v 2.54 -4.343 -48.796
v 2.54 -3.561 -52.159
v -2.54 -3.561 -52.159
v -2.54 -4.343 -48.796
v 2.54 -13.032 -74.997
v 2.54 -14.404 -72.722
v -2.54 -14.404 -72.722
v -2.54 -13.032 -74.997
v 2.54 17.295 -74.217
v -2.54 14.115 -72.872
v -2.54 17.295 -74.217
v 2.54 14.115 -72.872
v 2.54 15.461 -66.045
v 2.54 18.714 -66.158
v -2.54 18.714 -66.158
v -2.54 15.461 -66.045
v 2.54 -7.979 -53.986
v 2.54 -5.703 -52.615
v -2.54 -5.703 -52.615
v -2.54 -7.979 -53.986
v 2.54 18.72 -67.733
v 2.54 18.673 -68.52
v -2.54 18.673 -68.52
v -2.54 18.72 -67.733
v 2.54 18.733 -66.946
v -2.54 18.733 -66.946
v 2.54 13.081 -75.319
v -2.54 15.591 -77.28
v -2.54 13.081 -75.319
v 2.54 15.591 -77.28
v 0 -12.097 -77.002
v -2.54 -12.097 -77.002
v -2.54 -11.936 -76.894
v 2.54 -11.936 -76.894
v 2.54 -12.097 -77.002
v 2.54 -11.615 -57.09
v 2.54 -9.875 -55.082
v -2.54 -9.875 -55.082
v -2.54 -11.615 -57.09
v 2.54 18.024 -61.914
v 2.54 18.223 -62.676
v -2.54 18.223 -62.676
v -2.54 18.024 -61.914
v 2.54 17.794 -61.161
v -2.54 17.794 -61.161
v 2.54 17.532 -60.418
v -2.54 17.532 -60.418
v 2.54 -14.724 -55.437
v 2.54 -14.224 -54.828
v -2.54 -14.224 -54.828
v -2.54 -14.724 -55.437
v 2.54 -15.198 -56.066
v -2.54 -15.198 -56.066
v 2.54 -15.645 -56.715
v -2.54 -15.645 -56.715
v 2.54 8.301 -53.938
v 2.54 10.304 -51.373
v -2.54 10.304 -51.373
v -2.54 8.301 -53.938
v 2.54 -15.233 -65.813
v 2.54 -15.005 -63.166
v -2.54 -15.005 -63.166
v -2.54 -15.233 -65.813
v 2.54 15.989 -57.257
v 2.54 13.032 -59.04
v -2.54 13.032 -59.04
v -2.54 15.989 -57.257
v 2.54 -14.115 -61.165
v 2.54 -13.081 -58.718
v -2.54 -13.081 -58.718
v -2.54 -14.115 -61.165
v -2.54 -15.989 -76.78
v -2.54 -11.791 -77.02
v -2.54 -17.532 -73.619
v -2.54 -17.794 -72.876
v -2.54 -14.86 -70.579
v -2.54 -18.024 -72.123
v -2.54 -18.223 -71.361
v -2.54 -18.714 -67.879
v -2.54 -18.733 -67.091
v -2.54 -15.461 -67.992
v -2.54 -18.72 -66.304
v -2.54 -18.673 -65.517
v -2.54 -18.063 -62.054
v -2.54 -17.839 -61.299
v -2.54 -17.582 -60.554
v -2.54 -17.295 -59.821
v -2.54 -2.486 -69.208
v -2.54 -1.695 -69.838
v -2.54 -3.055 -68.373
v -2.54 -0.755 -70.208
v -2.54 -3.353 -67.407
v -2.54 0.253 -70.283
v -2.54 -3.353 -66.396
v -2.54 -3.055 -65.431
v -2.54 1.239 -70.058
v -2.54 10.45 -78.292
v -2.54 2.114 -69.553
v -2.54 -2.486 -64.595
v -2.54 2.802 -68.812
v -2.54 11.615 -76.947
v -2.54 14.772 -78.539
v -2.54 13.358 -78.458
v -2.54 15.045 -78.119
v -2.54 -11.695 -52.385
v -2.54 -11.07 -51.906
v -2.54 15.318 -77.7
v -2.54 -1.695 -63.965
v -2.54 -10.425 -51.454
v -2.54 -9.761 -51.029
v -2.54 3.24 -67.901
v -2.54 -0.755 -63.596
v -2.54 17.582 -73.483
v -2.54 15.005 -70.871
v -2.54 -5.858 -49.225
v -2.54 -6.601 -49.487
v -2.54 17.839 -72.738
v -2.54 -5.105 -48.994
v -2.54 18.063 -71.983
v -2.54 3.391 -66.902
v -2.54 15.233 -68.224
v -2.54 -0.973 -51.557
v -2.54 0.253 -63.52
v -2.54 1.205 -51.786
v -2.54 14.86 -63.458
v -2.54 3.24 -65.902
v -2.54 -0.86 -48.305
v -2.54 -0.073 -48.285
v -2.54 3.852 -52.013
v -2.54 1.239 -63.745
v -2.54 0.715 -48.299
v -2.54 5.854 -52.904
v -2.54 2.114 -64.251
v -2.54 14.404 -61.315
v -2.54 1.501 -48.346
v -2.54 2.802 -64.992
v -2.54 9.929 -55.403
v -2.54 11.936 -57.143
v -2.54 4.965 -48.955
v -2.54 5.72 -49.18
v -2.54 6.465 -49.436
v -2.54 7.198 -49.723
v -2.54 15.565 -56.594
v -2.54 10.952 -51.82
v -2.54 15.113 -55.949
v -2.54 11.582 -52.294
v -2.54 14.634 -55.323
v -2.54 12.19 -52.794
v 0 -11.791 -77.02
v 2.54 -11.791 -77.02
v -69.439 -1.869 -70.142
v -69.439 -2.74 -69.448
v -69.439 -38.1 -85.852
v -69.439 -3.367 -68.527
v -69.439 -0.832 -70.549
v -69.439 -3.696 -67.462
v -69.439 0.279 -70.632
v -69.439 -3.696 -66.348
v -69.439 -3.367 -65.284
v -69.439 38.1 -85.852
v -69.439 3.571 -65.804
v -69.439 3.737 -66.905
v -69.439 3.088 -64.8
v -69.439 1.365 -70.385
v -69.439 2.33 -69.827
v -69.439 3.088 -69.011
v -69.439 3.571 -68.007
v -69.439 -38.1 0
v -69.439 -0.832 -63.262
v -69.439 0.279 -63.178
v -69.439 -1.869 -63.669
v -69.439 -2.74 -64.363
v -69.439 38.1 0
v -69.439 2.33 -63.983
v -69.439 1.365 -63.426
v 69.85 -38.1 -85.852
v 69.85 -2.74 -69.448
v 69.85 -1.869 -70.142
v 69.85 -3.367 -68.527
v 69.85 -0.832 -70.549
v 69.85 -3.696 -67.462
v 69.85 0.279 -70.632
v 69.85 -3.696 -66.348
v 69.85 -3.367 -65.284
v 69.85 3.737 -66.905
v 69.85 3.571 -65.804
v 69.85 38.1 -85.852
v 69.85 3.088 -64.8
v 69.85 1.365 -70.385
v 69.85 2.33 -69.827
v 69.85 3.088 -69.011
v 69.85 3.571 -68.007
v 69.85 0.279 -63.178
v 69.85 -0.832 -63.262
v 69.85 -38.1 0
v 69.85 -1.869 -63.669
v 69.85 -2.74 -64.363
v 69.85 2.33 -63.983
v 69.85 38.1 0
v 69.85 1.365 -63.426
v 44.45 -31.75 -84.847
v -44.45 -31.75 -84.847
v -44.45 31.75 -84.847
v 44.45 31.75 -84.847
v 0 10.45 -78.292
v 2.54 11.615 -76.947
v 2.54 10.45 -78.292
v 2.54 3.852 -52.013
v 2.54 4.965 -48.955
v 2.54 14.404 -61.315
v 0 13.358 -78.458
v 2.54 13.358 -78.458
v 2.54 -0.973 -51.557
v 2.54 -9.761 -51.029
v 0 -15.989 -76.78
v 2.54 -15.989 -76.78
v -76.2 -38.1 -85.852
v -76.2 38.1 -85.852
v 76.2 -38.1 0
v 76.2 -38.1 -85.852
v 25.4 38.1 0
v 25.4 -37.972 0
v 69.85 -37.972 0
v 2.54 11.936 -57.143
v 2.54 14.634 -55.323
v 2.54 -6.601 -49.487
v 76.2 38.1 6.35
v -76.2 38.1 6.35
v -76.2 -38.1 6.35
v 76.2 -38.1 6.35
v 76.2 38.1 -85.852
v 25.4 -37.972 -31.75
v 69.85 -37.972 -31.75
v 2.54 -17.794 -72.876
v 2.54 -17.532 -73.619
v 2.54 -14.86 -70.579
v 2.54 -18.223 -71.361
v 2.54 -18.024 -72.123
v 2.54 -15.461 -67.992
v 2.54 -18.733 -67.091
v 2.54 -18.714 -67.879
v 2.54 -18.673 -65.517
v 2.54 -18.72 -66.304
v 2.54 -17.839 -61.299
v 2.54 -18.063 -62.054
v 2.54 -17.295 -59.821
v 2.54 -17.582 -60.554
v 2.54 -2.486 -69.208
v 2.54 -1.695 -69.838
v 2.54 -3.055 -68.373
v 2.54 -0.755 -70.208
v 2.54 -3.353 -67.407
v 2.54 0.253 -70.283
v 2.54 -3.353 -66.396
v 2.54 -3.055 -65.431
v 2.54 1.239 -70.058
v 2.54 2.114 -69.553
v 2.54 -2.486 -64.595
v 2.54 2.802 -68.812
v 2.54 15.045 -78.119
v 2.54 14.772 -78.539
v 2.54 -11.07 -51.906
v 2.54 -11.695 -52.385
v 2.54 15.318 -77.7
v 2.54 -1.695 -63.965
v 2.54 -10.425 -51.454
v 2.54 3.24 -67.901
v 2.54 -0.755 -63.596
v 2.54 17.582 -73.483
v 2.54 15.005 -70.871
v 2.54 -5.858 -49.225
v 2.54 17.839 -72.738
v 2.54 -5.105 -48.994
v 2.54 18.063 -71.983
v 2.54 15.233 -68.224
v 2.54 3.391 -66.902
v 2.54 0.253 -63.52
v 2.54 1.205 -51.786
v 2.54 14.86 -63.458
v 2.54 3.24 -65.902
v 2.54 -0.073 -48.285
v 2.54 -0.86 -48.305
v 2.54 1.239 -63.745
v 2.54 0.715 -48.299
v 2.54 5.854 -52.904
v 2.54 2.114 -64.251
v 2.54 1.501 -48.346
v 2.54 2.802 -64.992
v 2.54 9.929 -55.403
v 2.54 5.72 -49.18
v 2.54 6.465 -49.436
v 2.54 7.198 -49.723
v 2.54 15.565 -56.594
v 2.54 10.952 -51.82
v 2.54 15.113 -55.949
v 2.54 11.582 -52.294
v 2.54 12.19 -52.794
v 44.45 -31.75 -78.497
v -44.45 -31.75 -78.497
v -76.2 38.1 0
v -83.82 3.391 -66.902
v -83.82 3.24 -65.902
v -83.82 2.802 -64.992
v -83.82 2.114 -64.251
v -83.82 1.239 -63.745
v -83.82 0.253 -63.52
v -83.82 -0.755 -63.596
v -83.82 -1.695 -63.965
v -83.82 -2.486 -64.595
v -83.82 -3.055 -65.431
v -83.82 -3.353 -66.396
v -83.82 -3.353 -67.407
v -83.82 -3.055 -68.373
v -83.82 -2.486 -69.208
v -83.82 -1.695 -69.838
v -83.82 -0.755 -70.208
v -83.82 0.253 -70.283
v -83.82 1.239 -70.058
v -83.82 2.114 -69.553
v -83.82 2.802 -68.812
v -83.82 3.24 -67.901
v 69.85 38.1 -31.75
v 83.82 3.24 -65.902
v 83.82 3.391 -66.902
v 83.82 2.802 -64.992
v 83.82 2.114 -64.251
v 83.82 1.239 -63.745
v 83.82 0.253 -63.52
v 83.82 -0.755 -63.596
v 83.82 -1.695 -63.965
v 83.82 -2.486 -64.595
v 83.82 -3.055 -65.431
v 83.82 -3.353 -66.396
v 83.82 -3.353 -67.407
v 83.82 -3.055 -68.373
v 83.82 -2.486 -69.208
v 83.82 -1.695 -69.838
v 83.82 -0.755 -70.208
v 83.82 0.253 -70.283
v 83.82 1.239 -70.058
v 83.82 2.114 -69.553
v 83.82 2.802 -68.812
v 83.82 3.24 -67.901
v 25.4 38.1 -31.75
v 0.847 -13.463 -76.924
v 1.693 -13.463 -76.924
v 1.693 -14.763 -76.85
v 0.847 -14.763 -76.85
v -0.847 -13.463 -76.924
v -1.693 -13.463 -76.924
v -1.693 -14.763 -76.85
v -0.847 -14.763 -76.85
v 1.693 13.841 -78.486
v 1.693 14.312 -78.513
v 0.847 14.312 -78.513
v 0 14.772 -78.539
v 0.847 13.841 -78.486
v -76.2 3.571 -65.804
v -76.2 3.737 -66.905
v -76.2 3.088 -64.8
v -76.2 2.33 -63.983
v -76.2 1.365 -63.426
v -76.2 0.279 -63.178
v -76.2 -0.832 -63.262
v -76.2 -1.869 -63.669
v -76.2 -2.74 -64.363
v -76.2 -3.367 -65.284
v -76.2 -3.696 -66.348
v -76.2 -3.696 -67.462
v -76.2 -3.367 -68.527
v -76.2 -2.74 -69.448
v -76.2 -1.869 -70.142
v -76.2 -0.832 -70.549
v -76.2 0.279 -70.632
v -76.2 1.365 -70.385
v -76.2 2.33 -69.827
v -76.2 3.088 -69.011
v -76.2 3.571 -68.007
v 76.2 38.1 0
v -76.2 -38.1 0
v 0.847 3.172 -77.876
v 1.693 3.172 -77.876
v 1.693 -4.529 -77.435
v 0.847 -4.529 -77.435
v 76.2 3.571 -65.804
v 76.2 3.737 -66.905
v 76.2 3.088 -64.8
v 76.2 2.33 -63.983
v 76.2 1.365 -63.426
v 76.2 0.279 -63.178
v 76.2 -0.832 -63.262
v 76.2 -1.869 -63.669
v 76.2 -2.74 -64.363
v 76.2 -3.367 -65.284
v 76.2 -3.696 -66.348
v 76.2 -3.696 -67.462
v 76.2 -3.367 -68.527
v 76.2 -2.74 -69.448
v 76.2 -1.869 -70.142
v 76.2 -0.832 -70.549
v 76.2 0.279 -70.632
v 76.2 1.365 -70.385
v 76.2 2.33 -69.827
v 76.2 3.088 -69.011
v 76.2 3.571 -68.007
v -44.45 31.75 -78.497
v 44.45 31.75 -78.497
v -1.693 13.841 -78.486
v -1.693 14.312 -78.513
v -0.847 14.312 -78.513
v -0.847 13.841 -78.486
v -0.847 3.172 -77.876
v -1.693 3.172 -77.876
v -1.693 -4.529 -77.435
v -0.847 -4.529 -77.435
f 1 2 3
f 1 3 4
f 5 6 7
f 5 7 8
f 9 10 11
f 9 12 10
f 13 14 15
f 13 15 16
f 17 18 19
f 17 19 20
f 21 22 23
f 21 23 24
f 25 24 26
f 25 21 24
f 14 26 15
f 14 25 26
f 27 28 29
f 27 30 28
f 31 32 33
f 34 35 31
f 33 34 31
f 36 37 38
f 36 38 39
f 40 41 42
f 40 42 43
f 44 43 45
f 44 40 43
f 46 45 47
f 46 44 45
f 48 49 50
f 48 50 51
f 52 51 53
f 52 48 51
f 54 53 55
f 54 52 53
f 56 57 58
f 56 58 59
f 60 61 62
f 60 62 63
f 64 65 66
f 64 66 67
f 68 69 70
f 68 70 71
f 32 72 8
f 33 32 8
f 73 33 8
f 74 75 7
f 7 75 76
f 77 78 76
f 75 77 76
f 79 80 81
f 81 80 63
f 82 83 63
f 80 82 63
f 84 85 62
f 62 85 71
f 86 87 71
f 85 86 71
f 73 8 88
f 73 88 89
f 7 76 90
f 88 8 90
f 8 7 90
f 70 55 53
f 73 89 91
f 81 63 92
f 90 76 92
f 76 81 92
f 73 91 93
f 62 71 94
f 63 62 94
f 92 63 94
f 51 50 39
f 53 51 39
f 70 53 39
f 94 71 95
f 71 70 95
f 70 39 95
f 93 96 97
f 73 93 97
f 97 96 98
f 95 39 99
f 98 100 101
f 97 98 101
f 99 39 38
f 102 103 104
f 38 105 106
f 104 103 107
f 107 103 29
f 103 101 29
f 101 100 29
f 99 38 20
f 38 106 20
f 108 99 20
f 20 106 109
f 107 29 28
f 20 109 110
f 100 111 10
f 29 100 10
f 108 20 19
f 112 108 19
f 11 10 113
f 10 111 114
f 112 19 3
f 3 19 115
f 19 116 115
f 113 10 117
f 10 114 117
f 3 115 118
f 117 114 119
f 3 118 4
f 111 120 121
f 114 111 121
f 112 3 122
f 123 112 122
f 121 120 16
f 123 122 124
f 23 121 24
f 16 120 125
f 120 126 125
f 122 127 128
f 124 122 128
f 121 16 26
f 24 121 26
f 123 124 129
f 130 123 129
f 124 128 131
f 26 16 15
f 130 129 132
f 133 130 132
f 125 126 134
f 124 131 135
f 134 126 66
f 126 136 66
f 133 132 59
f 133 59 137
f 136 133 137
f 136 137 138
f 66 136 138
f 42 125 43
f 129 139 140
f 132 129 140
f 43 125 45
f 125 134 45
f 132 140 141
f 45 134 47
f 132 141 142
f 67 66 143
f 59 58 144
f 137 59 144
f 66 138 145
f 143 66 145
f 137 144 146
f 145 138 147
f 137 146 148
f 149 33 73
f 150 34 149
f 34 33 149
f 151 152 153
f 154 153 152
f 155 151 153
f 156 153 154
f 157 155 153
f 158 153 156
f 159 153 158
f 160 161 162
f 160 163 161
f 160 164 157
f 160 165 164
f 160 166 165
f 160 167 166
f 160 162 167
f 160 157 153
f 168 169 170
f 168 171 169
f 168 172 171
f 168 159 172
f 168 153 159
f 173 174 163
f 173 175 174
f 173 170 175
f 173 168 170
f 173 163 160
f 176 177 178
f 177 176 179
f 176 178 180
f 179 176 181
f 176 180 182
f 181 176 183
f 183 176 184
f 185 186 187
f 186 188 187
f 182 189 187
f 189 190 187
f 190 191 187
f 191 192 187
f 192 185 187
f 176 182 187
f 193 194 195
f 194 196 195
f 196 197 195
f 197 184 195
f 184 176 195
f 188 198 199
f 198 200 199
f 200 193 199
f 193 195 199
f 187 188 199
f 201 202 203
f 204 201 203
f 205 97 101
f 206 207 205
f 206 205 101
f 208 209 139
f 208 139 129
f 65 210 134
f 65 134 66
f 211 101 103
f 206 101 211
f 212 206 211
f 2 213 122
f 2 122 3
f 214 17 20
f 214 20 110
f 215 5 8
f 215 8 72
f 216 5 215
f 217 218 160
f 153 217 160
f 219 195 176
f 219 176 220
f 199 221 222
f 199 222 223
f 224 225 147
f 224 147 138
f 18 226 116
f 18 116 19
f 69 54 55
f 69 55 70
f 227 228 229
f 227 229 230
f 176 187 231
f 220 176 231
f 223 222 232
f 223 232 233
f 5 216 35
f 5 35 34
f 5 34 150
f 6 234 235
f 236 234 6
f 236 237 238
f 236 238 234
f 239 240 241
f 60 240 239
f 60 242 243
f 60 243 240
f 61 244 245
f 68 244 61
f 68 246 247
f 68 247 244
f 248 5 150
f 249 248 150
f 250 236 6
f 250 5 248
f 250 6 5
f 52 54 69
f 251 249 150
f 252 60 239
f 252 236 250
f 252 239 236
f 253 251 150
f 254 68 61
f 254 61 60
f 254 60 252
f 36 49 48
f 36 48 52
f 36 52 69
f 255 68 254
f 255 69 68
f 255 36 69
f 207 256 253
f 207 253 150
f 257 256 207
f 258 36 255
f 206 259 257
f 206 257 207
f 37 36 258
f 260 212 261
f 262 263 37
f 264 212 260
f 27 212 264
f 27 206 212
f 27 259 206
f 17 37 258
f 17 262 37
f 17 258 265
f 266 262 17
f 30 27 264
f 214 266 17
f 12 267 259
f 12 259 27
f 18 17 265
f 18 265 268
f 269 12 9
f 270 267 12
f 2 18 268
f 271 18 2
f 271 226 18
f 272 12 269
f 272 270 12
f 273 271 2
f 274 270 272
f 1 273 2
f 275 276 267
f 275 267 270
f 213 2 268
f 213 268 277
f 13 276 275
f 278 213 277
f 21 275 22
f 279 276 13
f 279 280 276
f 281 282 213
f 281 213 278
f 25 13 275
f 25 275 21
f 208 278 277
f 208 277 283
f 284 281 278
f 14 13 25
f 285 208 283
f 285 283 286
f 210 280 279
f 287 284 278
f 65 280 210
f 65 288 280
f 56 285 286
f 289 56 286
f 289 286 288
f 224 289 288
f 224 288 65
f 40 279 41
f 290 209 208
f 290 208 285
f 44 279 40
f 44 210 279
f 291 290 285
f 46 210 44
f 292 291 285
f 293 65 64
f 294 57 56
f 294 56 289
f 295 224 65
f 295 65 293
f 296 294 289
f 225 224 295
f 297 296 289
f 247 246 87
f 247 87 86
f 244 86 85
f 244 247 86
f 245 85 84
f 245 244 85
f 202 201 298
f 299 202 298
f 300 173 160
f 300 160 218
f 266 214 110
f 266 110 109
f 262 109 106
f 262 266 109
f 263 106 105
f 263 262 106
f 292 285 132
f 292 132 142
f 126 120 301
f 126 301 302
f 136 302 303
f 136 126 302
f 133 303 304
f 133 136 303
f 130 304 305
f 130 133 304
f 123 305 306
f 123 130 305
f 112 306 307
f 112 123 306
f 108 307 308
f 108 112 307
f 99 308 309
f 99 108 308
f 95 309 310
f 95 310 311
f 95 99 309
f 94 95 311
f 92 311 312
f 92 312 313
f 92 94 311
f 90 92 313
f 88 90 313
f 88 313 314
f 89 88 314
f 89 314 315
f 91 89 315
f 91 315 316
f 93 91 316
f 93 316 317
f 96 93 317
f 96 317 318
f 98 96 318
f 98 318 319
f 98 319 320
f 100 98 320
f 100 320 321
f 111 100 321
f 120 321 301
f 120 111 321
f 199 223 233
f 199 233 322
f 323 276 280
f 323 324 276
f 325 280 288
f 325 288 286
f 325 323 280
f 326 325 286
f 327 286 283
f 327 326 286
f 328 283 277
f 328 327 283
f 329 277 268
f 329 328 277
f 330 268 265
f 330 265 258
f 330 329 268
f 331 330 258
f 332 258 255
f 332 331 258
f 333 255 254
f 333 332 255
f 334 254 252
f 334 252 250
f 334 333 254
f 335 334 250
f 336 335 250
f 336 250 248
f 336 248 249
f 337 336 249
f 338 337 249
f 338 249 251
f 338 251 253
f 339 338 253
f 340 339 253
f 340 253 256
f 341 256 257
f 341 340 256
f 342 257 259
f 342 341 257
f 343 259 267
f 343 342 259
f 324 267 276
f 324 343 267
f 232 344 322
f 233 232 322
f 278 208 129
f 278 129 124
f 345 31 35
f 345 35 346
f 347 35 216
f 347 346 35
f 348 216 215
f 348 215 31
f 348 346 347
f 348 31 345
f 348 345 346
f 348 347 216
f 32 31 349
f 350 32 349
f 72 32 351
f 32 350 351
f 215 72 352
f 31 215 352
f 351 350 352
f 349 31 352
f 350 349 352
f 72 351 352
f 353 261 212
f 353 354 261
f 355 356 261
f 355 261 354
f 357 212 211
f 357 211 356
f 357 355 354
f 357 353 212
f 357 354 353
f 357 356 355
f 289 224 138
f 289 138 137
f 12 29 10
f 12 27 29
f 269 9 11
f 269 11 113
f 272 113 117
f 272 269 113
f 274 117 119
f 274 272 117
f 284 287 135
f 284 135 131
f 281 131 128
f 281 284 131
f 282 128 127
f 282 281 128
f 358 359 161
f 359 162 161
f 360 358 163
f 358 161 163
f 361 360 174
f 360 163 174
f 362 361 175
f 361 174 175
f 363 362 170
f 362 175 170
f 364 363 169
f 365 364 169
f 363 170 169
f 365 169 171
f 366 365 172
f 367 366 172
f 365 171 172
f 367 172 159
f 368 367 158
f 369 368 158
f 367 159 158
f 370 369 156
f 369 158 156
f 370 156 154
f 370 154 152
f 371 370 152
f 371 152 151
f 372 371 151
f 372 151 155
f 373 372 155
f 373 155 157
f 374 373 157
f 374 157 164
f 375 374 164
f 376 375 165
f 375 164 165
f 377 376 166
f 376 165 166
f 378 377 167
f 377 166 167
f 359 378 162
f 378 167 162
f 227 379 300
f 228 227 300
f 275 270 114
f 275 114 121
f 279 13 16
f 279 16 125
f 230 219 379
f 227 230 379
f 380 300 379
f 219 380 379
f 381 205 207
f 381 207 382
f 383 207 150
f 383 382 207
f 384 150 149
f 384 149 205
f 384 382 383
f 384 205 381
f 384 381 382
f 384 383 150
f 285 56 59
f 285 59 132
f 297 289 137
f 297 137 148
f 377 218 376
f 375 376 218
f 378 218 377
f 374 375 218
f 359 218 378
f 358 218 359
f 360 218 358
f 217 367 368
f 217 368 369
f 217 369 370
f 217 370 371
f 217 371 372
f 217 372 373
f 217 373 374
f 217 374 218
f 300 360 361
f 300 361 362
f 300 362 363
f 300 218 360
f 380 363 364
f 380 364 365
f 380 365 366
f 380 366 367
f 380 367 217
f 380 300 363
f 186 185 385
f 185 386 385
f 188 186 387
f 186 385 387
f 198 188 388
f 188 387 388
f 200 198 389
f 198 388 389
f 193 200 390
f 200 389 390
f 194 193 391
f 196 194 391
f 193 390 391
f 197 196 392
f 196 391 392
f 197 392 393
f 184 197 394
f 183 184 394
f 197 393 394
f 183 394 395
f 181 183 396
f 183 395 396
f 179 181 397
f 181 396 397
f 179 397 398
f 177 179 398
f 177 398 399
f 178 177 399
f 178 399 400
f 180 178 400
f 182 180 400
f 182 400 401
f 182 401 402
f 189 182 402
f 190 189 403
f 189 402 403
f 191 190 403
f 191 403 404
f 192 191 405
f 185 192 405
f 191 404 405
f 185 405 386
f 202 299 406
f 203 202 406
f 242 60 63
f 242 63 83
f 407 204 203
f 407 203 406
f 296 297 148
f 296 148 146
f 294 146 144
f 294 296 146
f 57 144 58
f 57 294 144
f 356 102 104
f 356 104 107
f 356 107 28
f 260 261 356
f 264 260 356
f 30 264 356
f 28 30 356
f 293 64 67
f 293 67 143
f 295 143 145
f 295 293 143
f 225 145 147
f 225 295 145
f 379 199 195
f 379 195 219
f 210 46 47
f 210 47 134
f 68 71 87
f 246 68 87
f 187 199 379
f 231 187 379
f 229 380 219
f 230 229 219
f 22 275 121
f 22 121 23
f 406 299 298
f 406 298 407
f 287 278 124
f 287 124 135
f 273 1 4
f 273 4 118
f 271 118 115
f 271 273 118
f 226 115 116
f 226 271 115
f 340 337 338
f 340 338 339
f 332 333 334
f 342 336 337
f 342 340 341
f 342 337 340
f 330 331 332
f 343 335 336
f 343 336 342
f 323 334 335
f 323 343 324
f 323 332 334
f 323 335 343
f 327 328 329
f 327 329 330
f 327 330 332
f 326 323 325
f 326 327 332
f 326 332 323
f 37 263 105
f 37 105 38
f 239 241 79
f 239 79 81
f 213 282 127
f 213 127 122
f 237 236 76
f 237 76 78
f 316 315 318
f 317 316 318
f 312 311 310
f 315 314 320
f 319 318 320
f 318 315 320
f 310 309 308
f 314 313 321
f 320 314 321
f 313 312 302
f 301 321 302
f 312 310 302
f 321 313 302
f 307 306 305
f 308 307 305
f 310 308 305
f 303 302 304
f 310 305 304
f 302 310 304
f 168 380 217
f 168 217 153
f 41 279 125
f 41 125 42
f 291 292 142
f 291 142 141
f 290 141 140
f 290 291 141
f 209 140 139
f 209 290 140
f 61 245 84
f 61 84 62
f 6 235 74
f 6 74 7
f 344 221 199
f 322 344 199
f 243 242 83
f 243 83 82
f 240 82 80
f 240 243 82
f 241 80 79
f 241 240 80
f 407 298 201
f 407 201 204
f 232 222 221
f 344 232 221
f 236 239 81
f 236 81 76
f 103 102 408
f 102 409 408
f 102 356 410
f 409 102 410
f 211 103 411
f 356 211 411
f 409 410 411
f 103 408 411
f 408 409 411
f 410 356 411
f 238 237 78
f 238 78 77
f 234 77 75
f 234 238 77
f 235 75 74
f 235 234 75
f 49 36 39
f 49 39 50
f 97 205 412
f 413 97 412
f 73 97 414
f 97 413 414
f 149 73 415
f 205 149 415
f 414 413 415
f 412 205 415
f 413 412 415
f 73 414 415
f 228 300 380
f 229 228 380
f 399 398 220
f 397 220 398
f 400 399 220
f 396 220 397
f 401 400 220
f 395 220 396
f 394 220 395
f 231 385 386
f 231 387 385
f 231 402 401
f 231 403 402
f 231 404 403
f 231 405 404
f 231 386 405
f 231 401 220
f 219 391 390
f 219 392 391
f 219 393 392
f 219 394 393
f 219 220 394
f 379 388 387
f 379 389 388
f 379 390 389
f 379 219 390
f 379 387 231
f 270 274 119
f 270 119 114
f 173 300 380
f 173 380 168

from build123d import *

# Parameters (mm, degrees)
F1_DEPTH  = 85.852
F0_W      = 6.35
F0_H      = 76.2
F2_DEPTH  = 6.35
F3_R      = 3.7374673342
F4_DEPTH  = 127
F5_W      = 44.45
F5_H      = 76.071806252
F6_DEPTH  = 31.75
F7_R      = 3.3908828081
F8_DEPTH  = 83.82
F10_W     = 63.5
F10_H     = 6.35
F11_DEPTH = 44.45
F13_DEPTH = 2.54


with BuildPart() as f1:
    # F0 (on Top) → F1 (new body)
    with BuildSketch(Plane.XY):
        Polygon((-69.4388685358, 38.1), (-69.85, 38.1), (-76.2, 38.1), (-76.2, -38.1), (-69.4388685358, -38.1), align=None)
    extrude(amount=-F1_DEPTH)


with BuildPart() as f1b:
    # F0 (on Top) → F1, piece 2 (new body)
    with BuildSketch(Plane.XY):
        with Locations((73.025, 0)):
            Rectangle(F0_W, F0_H)
    extrude(amount=-F1_DEPTH)


with BuildPart() as f2:
    # F0 (on Top) → F2 (new body)
    with BuildSketch(Plane.XY):
        Polygon((-69.4388685358, 38.1), (-69.85, 38.1), (-76.2, 38.1), (-76.2, -38.1), (-69.4388685358, -38.1), align=None)
        Polygon((-58.42, 38.1), (-69.4388685358, 38.1), (-69.4388685358, -38.1), (58.42, -38.1), (69.85, -38.1), (69.85, 38.1), (69.4388685358, 38.1), align=None)
        with Locations((73.025, 0)):
            Rectangle(F0_W, F0_H)
    extrude(amount=F2_DEPTH)


with BuildPart() as f4_tool:
    # F3 (on Right) → F4 (new body, symmetric)
    with BuildSketch(Plane.YZ):
        with Locations((0, -66.9054239988)):
            Circle(F3_R)
    extrude(amount=F4_DEPTH, both=True)


with BuildPart() as f1_1:
    add(f1.part)

    # F4: cut by f4_tool
    add(f4_tool.part, mode=Mode.SUBTRACT)


with BuildPart() as f1b_1:
    add(f1b.part)

    # F4: cut by f4_tool
    add(f4_tool.part, mode=Mode.SUBTRACT)


with BuildPart() as f6:
    # F5 (on Top) → F6 (new body)
    with BuildSketch(Plane.XY):
        with Locations((47.62501266, 0.0641494989)):
            Rectangle(F5_W, F5_H)
    extrude(amount=-F6_DEPTH)


with BuildPart() as f8:
    # F7 (on Right) → F8 (new body)
    with BuildSketch(Plane.YZ):
        with Locations((0, -66.9018488586)):
            Circle(F7_R)
    extrude(amount=F8_DEPTH)

    # F9: F8 across plane


with BuildPart() as f8_1:
    add(f8.part)
    add(f8.part.mirror(Plane.YZ))

    # F12 (on Right) → F13 (join, symmetric)
    with BuildSketch(Plane.YZ):
        with BuildLine():
            Line((14.1150064256, -72.8721348006), (17.2951930421, -74.2165740308))
            ThreePointArc((17.2951930421, -74.2165740308), (17.7145138023, -73.1120926095), (18.0633819527, -71.98337647))
            Line((18.0633819527, -71.98337647), (15.0053404351, -70.8707868344))
            Line((15.0053404351, -70.8707868344), (15.2330272054, -68.2238629194))
            Line((15.2330272054, -68.2238629194), (18.6730189801, -68.5197689002))
            ThreePointArc((18.6730189801, -68.5197689002), (18.7305131923, -67.3397674063), (18.7135140511, -66.1584883795))
            Line((18.7135140511, -66.1584883795), (15.4613346335, -66.0453395551))
            Line((15.4613346335, -66.0453395551), (14.8599331476, -63.4576062361))
            Line((14.8599331476, -63.4576062361), (18.2229997177, -62.6760136285))
            ThreePointArc((18.2229997177, -62.6760136285), (17.9130394479, -61.5359988299), (17.5318370095, -60.4177887374))
            Line((17.5318370095, -60.4177887374), (14.4038656726, -61.3151565194))
            Line((14.4038656726, -61.3151565194), (13.0322452981, -59.0399191636))
            Line((13.0322452981, -59.0399191636), (15.9891862759, -57.2573356977))
            ThreePointArc((15.9891862759, -57.2573356977), (15.3421125949, -56.2689001857), (14.63402161, -55.3232172224))
            Line((14.63402161, -55.3232172224), (11.9364459821, -57.143261))
            Line((11.9364459821, -57.143261), (9.9288704778, -55.4032356922))
            Line((9.9288704778, -55.4032356922), (12.1902398782, -52.7941530576))
            ThreePointArc((12.1902398782, -52.7941530576), (11.2693928663, -52.054051787), (10.303726214, -51.3734659904))
            Line((10.303726214, -51.3734659904), (8.3006037927, -53.9380271976))
            Line((8.3006037927, -53.9380271976), (5.8535886366, -52.9035397384))
            Line((5.8535886366, -52.9035397384), (7.1980278668, -49.7233531219))
            ThreePointArc((7.1980278668, -49.7233531219), (6.0935464454, -49.3040323618), (4.9648303059, -48.9551642114))
            Line((4.9648303059, -48.9551642114), (3.8522406703, -52.013205729))
            Line((3.8522406703, -52.013205729), (1.2053167553, -51.7855189586))
            Line((1.2053167553, -51.7855189586), (1.5012227362, -48.345527184))
            ThreePointArc((1.5012227362, -48.345527184), (0.3212212423, -48.2880329717), (-0.8600577845, -48.3050321129))
            Line((-0.8600577845, -48.3050321129), (-0.9732066089, -51.5572115305))
            Line((-0.9732066089, -51.5572115305), (-3.5609399279, -52.1586130164))
            Line((-3.5609399279, -52.1586130164), (-4.3425325355, -48.7955464463))
            ThreePointArc((-4.3425325355, -48.7955464463), (-5.4825473341, -49.1055067161), (-6.6007574266, -49.4867091545))
            Line((-6.6007574266, -49.4867091545), (-5.7033896446, -52.6146804914))
            Line((-5.7033896446, -52.6146804914), (-7.9786270005, -53.9863008659))
            Line((-7.9786270005, -53.9863008659), (-9.7612104664, -51.0293598881))
            ThreePointArc((-9.7612104664, -51.0293598881), (-10.7496459783, -51.6764335691), (-11.6953289416, -52.3845245541))
            Line((-11.6953289416, -52.3845245541), (-9.875285164, -55.082100182))
            Line((-9.875285164, -55.082100182), (-11.6153104718, -57.0896756863))
            Line((-11.6153104718, -57.0896756863), (-14.2243931064, -54.8283062859))
            ThreePointArc((-14.2243931064, -54.8283062859), (-14.964494377, -55.7491532978), (-15.6450801737, -56.71481995))
            Line((-15.6450801737, -56.71481995), (-13.0805189664, -58.7179423714))
            Line((-13.0805189664, -58.7179423714), (-14.1150064256, -61.1649575274))
            Line((-14.1150064256, -61.1649575274), (-17.2951930421, -59.8205182973))
            ThreePointArc((-17.2951930421, -59.8205182973), (-17.7145138023, -60.9249997186), (-18.0633819527, -62.0537158581))
            Line((-18.0633819527, -62.0537158581), (-15.0053404351, -63.1663054937))
            Line((-15.0053404351, -63.1663054937), (-15.2330272054, -65.8132294087))
            Line((-15.2330272054, -65.8132294087), (-18.6730189801, -65.5173234279))
            ThreePointArc((-18.6730189801, -65.5173234279), (-18.7305131923, -66.6973249217), (-18.7135140511, -67.8786039485))
            Line((-18.7135140511, -67.8786039485), (-15.4613346335, -67.991752773))
            Line((-15.4613346335, -67.991752773), (-14.8599331476, -70.5794860919))
            Line((-14.8599331476, -70.5794860919), (-18.2229997177, -71.3610786995))
            ThreePointArc((-18.2229997177, -71.3610786995), (-17.9130394479, -72.5010934982), (-17.5318370095, -73.6193035907))
            Line((-17.5318370095, -73.6193035907), (-14.4038656726, -72.7219358087))
            Line((-14.4038656726, -72.7219358087), (-13.0322452981, -74.9971731645))
            Line((-13.0322452981, -74.9971731645), (-15.9891862759, -76.7797566304))
            add(Edge.make_bspline(
                [(-12.0970000102, -77.002156506), (-13.4939239336, -76.9222965336), (-14.803098612, -76.8474854858), (-15.9891862759, -76.7797566304)],
                knots=[26.388656093, 26.388656093, 26.388656093, 26.388656093, 30.8115966534, 30.8115966534, 30.8115966534, 30.8115966534], degree=3))
            Line((-12.0970000102, -77.002156506), (-11.9364459821, -76.8938313281))
            Line((-11.9364459821, -76.8938313281), (-11.7913003112, -77.0196333914))
            add(Edge.make_bspline(
                [(10.4499796414, -78.2919313561), (3.6723046356, -77.9044311531), (-5.0374319065, -77.4057638079), (-11.7913003112, -77.0196333914)],
                knots=[4.8738978558, 4.8738978558, 4.8738978558, 4.8738978558, 26.0674714523, 26.0674714523, 26.0674714523, 26.0674714523], degree=3))
            Line((10.4499796414, -78.2919313561), (11.6153104718, -76.9474166418))
            Line((11.6153104718, -76.9474166418), (13.3583480911, -78.4581591088))
            add(Edge.make_bspline(
                [(14.7721507303, -78.5389137943), (14.3182491315, -78.5129947693), (13.8463214198, -78.4860385562), (13.3583480911, -78.4581591088)],
                knots=[0, 0, 0, 0, 1.6926065863, 1.6926065863, 1.6926065863, 1.6926065863], degree=3))
            ThreePointArc((14.7721507303, -78.5389137943), (15.1815522293, -77.909477064), (15.5912986716, -77.2802648281))
            Line((15.5912986715, -77.2802648282), (13.0805189664, -75.3191499567))
            Line((13.0805189664, -75.3191499567), (14.1150064256, -72.8721348006))
        make_face()
    extrude(amount=F13_DEPTH, both=True)


with BuildPart() as f11:
    # F10 (on Right) → F11 (new body, symmetric)
    with BuildSketch(Plane.YZ):
        with Locations((0, -81.6723555326)):
            Rectangle(F10_W, F10_H)
    extrude(amount=F11_DEPTH, both=True)


solid = Compound([f2.part, f1_1.part, f1b_1.part, f6.part, f8_1.part, f11.part])
